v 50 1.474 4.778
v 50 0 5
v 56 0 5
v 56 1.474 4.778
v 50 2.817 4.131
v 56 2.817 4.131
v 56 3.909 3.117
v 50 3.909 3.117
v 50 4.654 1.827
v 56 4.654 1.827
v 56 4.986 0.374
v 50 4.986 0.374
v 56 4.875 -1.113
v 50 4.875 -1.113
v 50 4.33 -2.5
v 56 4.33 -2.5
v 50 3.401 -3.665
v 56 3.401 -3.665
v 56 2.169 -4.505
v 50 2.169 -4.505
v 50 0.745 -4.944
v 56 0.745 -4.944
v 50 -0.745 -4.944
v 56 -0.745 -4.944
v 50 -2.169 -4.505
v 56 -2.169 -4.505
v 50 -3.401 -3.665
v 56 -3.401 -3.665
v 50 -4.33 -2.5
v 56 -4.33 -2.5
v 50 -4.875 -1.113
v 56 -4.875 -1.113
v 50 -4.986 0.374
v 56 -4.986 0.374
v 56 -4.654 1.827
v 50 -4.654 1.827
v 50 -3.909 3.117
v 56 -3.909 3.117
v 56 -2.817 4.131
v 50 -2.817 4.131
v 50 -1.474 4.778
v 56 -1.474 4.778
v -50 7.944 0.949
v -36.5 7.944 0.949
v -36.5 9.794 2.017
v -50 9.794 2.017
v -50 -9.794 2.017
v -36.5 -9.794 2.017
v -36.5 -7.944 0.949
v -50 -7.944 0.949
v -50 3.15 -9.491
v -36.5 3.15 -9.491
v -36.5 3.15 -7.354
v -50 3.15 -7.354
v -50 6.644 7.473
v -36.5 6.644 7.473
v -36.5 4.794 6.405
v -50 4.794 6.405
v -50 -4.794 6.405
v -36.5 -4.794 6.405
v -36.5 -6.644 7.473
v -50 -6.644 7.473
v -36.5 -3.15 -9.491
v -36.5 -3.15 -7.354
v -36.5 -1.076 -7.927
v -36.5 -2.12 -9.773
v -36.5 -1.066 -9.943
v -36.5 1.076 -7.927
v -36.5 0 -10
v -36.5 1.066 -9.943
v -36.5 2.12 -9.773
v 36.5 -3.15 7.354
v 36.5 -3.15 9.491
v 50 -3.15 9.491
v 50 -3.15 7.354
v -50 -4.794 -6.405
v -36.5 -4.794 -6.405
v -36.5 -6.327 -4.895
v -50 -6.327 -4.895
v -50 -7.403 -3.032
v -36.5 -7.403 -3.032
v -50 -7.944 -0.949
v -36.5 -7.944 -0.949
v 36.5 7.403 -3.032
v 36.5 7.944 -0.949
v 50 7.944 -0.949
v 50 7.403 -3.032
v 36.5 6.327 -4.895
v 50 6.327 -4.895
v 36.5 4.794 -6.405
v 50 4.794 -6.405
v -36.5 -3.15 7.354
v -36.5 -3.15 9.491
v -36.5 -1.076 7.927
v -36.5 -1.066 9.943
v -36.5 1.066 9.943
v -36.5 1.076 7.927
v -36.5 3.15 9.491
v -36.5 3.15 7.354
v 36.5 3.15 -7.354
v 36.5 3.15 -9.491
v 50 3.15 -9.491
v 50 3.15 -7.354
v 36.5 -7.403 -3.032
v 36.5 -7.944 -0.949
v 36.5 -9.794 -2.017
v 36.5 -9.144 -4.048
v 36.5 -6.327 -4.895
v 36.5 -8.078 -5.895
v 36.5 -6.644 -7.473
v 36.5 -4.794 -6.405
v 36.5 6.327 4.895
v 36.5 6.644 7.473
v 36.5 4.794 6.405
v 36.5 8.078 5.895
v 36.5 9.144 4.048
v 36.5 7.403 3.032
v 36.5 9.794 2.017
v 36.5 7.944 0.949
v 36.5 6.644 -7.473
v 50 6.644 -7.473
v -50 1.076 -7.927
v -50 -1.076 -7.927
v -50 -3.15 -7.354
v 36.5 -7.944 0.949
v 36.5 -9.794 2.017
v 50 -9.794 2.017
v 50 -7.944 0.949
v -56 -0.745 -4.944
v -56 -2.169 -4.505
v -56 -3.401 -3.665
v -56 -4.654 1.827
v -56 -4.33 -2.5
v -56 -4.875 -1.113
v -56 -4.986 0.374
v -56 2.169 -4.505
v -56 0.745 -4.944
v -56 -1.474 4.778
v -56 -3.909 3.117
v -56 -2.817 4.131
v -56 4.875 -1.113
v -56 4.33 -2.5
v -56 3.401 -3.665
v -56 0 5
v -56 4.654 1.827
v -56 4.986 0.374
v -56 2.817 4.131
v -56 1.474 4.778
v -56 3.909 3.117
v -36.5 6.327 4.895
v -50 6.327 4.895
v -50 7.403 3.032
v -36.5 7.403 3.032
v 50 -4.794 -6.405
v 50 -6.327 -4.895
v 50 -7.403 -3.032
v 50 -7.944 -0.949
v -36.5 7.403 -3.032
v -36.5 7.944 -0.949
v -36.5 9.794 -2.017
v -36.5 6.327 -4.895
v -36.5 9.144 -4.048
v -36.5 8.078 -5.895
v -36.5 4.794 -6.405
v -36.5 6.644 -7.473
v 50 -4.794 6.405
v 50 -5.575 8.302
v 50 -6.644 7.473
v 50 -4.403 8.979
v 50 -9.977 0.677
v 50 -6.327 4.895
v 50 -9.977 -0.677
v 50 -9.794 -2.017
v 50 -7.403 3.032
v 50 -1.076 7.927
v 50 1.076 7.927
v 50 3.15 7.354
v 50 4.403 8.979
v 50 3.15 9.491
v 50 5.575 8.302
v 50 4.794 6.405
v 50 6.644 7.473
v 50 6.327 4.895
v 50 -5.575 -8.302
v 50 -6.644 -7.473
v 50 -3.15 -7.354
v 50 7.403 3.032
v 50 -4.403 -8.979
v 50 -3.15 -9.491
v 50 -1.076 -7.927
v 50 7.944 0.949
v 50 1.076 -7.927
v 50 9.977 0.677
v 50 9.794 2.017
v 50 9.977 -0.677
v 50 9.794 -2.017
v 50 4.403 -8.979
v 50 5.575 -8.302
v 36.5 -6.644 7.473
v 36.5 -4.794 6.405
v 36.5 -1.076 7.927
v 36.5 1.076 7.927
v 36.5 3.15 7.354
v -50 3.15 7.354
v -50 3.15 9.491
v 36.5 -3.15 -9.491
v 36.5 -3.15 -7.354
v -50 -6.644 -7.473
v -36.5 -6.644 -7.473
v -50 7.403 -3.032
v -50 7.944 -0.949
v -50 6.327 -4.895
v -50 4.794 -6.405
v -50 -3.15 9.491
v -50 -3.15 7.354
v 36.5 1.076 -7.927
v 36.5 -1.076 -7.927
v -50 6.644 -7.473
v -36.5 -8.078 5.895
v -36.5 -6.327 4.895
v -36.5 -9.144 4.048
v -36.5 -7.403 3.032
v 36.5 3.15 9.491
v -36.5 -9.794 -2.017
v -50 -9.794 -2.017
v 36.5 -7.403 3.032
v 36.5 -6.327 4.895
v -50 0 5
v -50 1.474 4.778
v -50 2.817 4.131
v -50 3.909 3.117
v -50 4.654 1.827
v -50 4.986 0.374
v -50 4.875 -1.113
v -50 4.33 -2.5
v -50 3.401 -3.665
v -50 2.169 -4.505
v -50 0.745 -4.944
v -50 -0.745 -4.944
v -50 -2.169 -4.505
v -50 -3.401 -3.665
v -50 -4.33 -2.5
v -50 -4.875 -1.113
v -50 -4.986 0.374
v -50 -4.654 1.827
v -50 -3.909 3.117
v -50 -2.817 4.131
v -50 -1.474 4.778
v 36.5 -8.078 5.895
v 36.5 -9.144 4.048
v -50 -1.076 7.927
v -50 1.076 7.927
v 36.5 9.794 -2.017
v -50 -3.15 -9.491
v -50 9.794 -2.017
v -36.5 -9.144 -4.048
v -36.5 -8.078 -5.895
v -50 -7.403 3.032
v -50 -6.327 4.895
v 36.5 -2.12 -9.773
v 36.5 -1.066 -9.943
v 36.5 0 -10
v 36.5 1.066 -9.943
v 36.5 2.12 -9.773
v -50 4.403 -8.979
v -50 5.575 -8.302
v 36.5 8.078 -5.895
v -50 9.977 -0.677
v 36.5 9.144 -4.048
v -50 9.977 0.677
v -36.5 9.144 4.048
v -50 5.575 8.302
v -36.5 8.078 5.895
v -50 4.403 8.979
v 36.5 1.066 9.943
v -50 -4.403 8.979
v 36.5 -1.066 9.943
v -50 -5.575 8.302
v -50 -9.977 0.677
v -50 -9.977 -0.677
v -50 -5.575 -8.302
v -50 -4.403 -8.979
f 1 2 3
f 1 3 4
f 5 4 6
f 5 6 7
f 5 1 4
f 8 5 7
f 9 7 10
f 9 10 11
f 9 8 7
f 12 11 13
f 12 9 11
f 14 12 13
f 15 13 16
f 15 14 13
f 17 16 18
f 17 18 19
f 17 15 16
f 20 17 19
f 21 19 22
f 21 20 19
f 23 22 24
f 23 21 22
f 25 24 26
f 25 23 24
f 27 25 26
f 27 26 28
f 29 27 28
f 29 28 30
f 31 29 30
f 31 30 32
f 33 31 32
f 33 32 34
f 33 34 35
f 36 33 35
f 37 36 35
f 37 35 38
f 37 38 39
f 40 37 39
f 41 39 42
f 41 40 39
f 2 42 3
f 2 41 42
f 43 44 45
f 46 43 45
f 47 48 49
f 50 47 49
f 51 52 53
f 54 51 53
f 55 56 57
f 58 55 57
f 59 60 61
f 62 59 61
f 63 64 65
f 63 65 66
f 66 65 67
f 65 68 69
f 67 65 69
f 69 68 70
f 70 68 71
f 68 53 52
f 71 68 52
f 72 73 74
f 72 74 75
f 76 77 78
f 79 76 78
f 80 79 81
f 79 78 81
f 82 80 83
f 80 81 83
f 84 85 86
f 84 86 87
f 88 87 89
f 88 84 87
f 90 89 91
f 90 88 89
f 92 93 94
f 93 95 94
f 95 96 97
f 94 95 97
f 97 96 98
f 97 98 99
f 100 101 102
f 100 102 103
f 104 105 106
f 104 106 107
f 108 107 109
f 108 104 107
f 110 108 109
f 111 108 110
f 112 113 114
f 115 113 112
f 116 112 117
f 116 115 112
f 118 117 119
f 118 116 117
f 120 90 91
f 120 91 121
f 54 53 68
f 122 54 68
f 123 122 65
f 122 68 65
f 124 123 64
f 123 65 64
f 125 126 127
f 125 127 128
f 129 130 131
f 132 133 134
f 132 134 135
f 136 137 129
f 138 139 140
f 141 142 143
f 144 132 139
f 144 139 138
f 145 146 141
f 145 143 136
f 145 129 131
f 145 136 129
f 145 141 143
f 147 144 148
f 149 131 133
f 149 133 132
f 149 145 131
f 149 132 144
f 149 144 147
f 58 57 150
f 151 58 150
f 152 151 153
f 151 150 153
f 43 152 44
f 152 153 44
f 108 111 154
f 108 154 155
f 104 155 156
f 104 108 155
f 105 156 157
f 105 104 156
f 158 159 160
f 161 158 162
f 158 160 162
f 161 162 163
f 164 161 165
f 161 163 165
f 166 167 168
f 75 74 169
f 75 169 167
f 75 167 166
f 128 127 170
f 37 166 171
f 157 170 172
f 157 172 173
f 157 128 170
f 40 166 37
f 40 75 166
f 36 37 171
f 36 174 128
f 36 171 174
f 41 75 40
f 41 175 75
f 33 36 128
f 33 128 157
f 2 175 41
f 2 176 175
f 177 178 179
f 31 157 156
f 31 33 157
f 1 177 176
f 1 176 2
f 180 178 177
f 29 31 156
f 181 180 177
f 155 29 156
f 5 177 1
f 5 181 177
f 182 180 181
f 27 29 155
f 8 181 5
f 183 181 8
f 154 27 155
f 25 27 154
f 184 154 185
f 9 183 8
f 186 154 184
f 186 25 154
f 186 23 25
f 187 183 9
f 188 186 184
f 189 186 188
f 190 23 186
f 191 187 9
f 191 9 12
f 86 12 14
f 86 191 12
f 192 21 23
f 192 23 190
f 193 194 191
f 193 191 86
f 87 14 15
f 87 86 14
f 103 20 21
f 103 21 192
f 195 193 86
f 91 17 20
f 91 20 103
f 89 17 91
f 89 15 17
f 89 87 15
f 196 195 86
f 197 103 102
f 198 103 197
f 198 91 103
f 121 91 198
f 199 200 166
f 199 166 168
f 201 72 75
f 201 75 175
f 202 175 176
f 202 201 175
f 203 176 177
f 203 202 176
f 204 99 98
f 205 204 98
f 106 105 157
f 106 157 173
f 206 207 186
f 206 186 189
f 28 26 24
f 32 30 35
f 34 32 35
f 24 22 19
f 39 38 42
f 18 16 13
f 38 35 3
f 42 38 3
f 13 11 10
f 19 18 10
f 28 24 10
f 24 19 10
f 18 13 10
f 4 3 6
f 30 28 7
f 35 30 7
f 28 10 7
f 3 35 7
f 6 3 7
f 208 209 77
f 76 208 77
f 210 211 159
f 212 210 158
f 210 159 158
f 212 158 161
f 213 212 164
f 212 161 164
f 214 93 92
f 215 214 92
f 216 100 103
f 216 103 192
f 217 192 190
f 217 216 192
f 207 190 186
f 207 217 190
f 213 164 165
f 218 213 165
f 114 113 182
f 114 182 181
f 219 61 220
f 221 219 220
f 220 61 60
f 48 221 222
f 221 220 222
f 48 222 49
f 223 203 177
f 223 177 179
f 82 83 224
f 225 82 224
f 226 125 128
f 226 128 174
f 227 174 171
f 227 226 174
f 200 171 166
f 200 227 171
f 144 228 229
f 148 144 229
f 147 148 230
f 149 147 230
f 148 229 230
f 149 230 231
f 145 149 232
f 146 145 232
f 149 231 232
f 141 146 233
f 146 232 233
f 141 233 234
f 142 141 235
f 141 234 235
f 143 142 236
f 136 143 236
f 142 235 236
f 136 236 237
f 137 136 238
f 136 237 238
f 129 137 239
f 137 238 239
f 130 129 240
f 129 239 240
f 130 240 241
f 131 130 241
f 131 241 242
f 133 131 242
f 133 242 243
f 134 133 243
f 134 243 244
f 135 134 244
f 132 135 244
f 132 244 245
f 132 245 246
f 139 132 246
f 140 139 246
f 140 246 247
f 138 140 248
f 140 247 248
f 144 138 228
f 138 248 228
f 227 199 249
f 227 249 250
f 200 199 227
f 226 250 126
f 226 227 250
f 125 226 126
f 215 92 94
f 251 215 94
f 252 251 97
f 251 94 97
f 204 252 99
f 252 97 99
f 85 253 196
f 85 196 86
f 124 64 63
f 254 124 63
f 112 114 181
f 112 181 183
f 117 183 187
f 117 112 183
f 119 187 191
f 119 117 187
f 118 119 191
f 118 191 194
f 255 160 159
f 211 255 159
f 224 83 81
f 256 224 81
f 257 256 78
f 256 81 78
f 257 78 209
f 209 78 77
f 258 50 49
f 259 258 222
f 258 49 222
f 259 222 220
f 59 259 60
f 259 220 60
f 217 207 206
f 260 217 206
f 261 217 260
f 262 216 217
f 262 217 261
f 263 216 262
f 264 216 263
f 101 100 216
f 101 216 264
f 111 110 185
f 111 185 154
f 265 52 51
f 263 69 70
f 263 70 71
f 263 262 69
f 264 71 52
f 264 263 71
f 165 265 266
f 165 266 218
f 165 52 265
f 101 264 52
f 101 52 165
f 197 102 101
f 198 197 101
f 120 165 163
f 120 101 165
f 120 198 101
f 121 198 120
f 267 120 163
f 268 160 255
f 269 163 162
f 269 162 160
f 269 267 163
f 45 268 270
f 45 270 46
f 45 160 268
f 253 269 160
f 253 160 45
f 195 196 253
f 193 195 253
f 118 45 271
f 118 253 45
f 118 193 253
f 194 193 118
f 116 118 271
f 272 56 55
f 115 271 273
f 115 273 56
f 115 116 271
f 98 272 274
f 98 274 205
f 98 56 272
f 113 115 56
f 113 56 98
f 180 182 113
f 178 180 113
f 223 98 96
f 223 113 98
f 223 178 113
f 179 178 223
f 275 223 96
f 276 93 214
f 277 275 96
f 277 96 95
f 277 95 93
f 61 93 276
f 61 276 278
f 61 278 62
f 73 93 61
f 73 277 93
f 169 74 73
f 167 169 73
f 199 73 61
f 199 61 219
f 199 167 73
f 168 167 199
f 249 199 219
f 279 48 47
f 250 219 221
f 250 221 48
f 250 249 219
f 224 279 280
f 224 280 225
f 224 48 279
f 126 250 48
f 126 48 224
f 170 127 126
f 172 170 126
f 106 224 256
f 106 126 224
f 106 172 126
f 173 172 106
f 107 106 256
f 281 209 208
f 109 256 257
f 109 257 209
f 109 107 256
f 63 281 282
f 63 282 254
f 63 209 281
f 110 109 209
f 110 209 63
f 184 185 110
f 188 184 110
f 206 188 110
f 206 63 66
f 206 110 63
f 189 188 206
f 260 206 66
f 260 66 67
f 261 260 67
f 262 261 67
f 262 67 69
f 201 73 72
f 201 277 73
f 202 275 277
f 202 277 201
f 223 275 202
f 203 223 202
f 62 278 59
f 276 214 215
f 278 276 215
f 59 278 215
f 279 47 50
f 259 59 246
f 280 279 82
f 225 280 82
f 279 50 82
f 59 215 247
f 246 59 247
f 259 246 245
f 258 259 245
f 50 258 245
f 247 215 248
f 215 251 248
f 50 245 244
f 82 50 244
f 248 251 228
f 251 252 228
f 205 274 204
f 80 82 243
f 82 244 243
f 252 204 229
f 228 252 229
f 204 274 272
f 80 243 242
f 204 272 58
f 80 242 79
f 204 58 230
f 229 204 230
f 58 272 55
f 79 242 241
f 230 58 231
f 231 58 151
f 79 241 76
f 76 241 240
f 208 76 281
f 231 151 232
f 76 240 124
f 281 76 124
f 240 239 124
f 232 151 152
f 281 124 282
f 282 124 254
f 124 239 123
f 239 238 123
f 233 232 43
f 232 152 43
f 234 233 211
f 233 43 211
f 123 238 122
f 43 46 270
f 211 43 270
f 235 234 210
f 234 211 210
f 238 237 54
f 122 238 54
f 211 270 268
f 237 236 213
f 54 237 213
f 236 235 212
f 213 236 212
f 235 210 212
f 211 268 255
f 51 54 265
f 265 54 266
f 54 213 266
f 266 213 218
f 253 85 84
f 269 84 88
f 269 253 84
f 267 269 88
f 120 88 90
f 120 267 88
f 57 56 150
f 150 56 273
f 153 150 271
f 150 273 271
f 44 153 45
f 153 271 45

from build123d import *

# Parameters (mm, degrees)
SKETCH2_R           = 10
BOSS_EXTRUDE1_DEPTH = 50
CUT_EXTRUDE3_DEPTH  = 88.648445508
SKETCH5_R           = 5
BOSS_EXTRUDE2_DEPTH = 6


with BuildPart() as part:
    # Sketch2 → Boss-Extrude1 (new, symmetric)
    with BuildSketch(Plane(origin=(0, 0, 0), x_dir=(0, 0, -1), z_dir=(1, 0, 0))):
        Circle(SKETCH2_R)
    extrude(amount=BOSS_EXTRUDE1_DEPTH, both=True)

    # Sketch4 → Cut-Extrude3 (cut, through all)
    with BuildSketch(Plane(origin=(-36.5, 0, 0), x_dir=(0, 0, -1), z_dir=(1, 0, 0))):
        with BuildLine():
            Line((7.353740545, -3.15), (9.49091671, -3.15))
            ThreePointArc((9.49091671, -3.15), (10, 0), (9.49091671, 3.15))
            Line((9.49091671, 3.15), (7.353740545, 3.15))
            ThreePointArc((7.353740545, 3.15), (8, 0), (7.353740545, -3.15))
        make_face()
        with BuildLine():
            Line((-7.473438377, 6.644374976), (-6.404850294, 4.793526125))
            ThreePointArc((-6.404850294, 4.793526125), (-4, 6.92820323), (-0.94889025, 7.943526125))
            Line((-0.94889025, 7.943526125), (-2.017478333, 9.794374976))
            ThreePointArc((-2.017478333, 9.794374976), (-5, 8.660254038), (-7.473438377, 6.644374976))
        make_face()
        with BuildLine():
            Line((-9.49091671, -3.15), (-7.353740545, -3.15))
            ThreePointArc((-7.353740545, -3.15), (-8, 0), (-7.353740545, 3.15))
            Line((-7.353740545, 3.15), (-9.49091671, 3.15))
            ThreePointArc((-9.49091671, 3.15), (-10, 0), (-9.49091671, -3.15))
        make_face()
        with BuildLine():
            Line((-2.017478333, -9.794374976), (-0.94889025, -7.943526125))
            ThreePointArc((-0.94889025, -7.943526125), (-4, -6.92820323), (-6.404850294, -4.793526125))
            Line((-6.404850294, -4.793526125), (-7.473438377, -6.644374976))
            ThreePointArc((-7.473438377, -6.644374976), (-5, -8.660254038), (-2.017478333, -9.794374976))
        make_face()
        with BuildLine():
            Line((0.94889025, -7.943526125), (2.017478333, -9.794374976))
            ThreePointArc((2.017478333, -9.794374976), (5, -8.660254038), (7.473438377, -6.644374976))
            Line((7.473438377, -6.644374976), (6.404850294, -4.793526125))
            ThreePointArc((6.404850294, -4.793526125), (4, -6.92820323), (0.94889025, -7.943526125))
        make_face()
        with BuildLine():
            Line((6.404850294, 4.793526125), (7.473438377, 6.644374976))
            ThreePointArc((7.473438377, 6.644374976), (5, 8.660254038), (2.017478333, 9.794374976))
            Line((2.017478333, 9.794374976), (0.94889025, 7.943526125))
            ThreePointArc((0.94889025, 7.943526125), (4, 6.92820323), (6.404850294, 4.793526125))
        make_face()
    cut_extrude3 = extrude(amount=-CUT_EXTRUDE3_DEPTH, mode=Mode.SUBTRACT)

    # Sketch5 → Boss-Extrude2 (add)
    with BuildSketch(Plane.ZY.offset(50)):
        Circle(SKETCH5_R)
    boss_extrude2 = extrude(amount=BOSS_EXTRUDE2_DEPTH)

    # Mirror3: Cut-Extrude3, Boss-Extrude2 across plane
    add(cut_extrude3.mirror(Plane(origin=(0, 0, 0), x_dir=(0, 0, 1), z_dir=(1, 0, 0))), mode=Mode.SUBTRACT)
    add(boss_extrude2.mirror(Plane(origin=(0, 0, 0), x_dir=(0, 0, 1), z_dir=(1, 0, 0))))


solid = part.part
